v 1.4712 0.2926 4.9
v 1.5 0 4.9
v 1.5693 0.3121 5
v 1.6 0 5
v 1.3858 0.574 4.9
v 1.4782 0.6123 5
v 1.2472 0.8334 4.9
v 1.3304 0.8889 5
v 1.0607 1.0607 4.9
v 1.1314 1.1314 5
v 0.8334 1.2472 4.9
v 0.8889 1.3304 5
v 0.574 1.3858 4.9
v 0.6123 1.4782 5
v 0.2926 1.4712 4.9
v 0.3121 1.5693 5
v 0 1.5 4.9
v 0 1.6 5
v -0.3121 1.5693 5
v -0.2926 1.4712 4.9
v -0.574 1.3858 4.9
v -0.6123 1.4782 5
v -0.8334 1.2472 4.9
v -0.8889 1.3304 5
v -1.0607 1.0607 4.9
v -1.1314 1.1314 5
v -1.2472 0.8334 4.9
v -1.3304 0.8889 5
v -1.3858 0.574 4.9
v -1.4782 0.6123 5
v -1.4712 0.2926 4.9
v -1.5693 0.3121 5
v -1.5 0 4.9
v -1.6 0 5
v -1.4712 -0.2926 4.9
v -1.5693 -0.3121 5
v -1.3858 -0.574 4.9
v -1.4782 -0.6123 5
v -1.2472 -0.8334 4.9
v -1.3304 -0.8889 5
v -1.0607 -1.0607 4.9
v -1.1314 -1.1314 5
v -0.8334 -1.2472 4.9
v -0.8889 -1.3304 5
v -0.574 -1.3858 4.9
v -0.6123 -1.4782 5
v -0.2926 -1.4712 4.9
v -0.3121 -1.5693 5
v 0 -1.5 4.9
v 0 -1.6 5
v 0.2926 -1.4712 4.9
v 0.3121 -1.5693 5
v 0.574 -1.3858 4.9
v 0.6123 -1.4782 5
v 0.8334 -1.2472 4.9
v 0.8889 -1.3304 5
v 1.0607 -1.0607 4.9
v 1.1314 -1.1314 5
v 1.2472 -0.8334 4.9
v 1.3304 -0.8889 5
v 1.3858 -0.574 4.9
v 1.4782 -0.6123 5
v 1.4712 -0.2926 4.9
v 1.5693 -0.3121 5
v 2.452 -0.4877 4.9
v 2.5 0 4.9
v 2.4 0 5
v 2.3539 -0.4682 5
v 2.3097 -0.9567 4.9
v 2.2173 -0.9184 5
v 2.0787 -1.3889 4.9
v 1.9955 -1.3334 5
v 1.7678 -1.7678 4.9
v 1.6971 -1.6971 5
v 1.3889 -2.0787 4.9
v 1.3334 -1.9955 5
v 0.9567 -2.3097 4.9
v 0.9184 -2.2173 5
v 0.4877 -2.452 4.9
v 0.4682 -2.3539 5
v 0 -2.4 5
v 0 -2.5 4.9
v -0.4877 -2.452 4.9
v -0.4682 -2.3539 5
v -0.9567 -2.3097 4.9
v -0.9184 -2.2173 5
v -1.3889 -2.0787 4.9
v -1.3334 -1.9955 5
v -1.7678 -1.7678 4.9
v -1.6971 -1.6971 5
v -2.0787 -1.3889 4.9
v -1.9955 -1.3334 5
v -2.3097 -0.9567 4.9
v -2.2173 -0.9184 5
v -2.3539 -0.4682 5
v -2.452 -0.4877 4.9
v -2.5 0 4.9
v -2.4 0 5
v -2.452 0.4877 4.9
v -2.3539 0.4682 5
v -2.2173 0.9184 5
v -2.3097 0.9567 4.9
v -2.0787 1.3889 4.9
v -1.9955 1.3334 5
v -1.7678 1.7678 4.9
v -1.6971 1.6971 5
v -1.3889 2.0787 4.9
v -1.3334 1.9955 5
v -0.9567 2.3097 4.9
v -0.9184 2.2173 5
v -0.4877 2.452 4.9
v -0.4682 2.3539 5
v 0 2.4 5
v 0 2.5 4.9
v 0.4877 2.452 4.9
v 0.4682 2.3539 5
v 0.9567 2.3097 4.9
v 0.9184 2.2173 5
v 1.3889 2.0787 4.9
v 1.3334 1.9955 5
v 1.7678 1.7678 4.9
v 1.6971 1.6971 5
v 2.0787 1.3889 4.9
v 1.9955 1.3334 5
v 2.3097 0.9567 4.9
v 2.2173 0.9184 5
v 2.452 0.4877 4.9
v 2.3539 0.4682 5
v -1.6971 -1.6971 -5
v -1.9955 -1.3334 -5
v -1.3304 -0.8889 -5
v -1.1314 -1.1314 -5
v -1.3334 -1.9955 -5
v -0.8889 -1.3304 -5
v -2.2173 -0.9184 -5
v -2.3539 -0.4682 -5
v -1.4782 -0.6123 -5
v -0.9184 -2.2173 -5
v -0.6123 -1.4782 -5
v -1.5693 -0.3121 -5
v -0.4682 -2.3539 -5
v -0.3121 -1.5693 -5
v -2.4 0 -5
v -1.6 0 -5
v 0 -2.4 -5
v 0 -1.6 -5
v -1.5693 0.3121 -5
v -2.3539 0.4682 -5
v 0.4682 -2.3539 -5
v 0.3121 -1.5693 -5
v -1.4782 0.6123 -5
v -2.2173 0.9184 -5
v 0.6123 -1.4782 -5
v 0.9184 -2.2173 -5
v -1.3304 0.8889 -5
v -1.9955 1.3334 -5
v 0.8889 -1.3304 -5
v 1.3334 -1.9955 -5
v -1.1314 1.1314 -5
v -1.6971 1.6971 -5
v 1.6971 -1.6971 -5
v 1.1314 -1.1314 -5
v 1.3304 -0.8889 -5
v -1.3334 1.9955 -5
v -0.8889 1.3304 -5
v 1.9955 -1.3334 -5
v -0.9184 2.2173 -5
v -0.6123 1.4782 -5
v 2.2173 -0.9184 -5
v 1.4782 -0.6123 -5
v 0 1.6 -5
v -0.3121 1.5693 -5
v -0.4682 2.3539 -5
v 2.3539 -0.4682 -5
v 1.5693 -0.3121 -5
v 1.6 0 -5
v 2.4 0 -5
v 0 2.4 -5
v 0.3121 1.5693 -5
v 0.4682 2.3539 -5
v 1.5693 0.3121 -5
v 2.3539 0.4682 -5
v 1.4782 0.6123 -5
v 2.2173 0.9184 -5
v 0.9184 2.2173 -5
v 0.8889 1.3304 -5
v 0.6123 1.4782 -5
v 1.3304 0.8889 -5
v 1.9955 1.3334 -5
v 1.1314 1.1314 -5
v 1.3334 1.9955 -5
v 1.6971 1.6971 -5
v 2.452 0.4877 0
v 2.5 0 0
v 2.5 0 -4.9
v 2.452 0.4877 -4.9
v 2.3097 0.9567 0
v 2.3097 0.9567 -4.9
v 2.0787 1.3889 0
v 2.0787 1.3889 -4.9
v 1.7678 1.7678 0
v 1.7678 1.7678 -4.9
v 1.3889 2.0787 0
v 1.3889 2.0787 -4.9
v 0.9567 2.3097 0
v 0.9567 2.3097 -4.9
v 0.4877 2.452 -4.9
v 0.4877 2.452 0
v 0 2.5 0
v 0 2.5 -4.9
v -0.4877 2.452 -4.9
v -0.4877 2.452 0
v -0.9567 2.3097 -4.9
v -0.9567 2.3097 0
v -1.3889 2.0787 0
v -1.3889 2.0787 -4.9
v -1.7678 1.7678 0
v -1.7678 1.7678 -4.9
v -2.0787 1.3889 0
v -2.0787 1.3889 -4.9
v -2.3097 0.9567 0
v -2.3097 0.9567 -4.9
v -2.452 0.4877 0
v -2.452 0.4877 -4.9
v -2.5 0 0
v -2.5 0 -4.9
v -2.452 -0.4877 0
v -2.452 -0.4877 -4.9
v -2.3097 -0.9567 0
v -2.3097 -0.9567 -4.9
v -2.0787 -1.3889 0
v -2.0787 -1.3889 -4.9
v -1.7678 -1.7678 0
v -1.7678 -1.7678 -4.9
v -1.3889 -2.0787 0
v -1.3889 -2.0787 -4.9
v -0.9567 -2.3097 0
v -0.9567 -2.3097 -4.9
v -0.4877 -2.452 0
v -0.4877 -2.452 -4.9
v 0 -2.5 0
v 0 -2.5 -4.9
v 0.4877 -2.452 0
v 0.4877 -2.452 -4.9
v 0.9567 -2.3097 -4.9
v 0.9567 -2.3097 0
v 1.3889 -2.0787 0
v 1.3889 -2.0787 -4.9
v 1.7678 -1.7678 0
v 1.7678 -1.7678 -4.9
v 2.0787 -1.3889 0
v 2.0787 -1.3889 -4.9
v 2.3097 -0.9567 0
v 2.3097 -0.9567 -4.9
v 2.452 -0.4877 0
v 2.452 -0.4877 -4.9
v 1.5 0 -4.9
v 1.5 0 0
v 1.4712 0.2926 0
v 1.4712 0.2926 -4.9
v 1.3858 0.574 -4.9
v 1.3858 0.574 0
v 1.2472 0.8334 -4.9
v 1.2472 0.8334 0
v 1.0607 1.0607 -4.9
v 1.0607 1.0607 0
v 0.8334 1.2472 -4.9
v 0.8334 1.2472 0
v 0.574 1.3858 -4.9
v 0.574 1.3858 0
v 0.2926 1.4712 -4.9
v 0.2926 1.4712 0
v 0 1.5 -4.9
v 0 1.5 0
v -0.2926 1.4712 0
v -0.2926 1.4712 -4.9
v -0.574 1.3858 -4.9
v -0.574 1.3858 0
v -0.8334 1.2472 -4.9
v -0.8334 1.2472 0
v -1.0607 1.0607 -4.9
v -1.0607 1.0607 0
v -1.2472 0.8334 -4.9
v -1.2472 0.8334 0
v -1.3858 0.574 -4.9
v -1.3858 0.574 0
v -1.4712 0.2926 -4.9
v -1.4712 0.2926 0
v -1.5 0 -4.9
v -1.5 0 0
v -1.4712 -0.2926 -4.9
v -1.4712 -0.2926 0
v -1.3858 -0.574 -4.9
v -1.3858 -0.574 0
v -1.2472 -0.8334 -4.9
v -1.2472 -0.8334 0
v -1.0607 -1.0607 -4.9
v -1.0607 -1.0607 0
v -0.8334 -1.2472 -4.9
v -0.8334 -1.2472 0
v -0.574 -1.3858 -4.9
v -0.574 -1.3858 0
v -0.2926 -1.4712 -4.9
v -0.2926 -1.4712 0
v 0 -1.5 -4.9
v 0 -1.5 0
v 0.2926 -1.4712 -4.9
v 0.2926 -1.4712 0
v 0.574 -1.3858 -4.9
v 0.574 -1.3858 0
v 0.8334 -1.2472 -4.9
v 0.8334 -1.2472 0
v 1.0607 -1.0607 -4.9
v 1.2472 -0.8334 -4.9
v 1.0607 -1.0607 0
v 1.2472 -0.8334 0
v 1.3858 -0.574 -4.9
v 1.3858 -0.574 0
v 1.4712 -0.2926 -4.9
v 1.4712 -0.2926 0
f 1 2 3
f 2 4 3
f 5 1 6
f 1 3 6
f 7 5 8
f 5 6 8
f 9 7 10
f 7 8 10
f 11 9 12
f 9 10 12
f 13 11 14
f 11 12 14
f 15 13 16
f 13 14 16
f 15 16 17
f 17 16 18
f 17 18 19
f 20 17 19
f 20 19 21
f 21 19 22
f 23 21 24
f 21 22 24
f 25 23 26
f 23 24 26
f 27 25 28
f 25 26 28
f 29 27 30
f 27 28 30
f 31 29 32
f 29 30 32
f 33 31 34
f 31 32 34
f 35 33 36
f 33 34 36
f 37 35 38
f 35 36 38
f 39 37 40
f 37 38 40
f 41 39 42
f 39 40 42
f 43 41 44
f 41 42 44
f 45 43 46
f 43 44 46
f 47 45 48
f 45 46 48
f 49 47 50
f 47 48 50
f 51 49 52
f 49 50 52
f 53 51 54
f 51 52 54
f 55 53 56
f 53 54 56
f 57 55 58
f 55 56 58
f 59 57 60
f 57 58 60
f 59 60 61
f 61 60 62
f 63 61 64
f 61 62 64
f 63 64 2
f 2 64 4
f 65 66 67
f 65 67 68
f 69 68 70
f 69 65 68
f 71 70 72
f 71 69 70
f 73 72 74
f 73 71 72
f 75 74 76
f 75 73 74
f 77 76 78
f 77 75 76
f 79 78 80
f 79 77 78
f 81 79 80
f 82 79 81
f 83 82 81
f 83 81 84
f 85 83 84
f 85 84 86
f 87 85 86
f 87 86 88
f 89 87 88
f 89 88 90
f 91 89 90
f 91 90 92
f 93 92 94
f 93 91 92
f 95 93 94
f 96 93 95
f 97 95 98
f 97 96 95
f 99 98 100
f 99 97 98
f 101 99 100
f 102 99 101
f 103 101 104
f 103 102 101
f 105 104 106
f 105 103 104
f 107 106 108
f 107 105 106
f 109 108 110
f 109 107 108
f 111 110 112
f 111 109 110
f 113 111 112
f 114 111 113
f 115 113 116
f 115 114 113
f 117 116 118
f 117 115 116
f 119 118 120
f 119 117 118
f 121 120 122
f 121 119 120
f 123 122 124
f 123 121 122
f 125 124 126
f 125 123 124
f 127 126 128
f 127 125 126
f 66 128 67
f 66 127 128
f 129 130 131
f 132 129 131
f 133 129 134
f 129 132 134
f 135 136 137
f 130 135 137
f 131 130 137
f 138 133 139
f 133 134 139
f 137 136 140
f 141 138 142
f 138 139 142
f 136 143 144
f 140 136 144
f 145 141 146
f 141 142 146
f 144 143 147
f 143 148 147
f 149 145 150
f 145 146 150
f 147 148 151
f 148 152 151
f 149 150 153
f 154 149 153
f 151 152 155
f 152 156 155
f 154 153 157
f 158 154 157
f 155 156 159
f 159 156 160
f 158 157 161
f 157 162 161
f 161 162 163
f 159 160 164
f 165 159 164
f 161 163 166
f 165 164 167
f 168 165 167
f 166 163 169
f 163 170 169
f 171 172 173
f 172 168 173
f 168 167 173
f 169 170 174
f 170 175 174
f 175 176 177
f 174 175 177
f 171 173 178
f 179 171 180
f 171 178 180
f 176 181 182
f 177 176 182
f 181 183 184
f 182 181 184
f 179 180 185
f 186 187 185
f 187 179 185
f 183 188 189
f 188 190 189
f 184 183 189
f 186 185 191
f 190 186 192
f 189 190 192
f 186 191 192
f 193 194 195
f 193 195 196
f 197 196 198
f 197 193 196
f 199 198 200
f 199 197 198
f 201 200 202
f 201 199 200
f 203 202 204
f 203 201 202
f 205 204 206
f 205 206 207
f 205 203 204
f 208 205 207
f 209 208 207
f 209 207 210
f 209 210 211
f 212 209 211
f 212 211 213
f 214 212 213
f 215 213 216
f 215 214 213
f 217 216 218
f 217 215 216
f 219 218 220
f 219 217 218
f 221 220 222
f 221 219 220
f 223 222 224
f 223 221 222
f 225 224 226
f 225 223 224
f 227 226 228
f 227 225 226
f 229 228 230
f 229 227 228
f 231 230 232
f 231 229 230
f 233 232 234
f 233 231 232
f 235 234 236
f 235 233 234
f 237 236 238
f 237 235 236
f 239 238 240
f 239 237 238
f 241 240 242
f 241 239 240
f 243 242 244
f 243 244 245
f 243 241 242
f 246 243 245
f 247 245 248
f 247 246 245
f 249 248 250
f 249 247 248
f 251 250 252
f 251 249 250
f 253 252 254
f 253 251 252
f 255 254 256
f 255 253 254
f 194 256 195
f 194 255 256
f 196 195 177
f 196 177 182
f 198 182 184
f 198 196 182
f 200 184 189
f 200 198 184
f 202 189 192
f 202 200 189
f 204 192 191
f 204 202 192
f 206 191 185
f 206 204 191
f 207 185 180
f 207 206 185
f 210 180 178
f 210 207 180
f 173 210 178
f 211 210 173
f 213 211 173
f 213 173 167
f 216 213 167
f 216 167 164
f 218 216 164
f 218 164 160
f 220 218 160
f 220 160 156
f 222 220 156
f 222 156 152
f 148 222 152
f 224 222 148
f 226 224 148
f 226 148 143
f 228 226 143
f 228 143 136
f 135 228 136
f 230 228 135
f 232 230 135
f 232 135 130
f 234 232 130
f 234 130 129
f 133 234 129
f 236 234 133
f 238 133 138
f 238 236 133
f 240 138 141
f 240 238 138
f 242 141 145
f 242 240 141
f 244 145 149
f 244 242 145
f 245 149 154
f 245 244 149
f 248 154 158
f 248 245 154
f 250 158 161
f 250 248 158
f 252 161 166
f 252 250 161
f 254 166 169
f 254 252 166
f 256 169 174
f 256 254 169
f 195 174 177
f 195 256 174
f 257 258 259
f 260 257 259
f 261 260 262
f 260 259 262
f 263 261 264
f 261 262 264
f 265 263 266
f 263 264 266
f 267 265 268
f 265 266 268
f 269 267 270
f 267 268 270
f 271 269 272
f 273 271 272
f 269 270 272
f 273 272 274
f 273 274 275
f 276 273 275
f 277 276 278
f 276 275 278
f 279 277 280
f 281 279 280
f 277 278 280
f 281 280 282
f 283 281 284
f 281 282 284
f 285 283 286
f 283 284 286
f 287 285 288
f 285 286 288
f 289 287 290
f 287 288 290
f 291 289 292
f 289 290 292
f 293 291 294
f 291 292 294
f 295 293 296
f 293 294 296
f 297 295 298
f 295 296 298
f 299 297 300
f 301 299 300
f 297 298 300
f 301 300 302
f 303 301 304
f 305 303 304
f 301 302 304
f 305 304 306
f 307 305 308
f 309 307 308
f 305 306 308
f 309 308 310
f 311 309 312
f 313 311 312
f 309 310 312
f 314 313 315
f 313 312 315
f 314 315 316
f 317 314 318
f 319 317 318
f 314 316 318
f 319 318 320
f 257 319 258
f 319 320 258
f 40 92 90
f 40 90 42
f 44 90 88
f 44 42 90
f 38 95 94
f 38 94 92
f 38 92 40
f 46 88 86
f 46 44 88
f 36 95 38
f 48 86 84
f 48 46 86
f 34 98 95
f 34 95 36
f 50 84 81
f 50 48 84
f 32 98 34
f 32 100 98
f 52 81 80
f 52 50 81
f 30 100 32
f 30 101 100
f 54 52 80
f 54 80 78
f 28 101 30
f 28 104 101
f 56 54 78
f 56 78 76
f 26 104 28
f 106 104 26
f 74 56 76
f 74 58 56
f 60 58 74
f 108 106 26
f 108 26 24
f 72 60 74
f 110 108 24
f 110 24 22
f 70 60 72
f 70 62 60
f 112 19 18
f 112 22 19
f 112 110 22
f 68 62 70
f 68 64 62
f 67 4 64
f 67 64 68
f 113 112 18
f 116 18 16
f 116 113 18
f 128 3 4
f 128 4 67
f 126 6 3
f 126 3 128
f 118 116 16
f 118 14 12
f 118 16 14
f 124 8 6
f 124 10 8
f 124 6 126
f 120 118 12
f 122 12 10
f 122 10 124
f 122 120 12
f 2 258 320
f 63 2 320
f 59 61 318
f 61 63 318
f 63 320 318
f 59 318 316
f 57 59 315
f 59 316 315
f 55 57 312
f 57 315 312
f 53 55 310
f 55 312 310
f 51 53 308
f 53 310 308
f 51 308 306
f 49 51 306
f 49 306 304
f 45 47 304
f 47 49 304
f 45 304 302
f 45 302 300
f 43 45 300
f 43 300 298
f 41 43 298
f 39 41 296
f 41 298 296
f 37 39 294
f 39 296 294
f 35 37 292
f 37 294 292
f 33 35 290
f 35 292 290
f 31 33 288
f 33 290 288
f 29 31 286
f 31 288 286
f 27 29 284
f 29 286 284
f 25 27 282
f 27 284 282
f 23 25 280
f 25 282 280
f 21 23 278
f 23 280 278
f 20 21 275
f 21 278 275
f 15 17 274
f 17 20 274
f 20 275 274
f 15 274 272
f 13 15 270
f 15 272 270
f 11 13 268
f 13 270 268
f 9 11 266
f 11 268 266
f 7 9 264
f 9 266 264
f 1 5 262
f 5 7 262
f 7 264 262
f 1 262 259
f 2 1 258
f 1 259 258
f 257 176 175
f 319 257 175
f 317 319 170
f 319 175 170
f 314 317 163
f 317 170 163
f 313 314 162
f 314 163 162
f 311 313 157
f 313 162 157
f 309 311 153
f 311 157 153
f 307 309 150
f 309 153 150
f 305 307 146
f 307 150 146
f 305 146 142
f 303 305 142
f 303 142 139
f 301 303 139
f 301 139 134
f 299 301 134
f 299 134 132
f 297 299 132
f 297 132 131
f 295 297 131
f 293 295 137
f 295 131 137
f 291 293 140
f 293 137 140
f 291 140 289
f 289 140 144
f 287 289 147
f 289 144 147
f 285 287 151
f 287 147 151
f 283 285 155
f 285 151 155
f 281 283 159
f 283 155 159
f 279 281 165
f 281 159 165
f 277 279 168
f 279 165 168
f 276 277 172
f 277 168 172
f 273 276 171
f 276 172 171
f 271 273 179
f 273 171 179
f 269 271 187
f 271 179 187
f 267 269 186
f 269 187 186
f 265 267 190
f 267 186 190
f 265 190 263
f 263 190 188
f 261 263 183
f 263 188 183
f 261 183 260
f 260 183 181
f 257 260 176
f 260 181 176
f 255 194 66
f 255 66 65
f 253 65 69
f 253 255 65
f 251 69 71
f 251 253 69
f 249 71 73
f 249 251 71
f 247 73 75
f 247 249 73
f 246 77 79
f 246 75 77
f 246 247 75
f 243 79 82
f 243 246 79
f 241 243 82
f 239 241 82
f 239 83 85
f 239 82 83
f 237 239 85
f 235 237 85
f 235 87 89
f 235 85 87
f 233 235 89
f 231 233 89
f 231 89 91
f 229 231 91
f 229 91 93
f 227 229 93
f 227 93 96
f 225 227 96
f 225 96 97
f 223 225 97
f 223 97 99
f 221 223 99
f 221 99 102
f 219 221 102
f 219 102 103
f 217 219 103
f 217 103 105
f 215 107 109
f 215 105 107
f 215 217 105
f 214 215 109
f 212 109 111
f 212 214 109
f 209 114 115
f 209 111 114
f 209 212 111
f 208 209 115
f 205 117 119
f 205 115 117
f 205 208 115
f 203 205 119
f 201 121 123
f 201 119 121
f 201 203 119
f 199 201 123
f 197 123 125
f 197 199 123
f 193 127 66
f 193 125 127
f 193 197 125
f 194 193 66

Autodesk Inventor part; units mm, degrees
ref_plane "YZ Plane" through (0, 0, 0) normal (1, 0, 0) x (0, 1, 0)
ref_plane "XZ Plane" through (0, 0, 0) normal (0, 1, 0) x (-1, 0, 0)
ref_plane "XY Plane" through (0, 0, 0) normal (0, 0, 1) x (1, 0, 0)
sketch "Sketch1" plane through (0, 0, 0) normal (0, 0, 1) x (1, 0, 0)
  circle A0 centre (0, 0) radius 2.5
  circle A1 centre (0, 0) radius 1.5
  dimension "d0" = 5
  dimension "d1" = 3
extrude "Extrusion1" add sketch "Sketch1" along normal mid plane 10
thread "Thread1" size "M3x0.5" class "6H" standard "ANSI Metric M Profile" length 10
thread "Thread2" size "M3x0.5" class "6H" standard "ANSI Metric M Profile" length 10
chamfer "Chamfer1" distance 0.1 angle 45 4 edges at (-2.5, 0, 5) (-1.5, 0, 5) (-1.5, 0, -5) (-2.5, 0, -5)
properties part number "M3 10mm Standoff" material "Aluminum 6061"
